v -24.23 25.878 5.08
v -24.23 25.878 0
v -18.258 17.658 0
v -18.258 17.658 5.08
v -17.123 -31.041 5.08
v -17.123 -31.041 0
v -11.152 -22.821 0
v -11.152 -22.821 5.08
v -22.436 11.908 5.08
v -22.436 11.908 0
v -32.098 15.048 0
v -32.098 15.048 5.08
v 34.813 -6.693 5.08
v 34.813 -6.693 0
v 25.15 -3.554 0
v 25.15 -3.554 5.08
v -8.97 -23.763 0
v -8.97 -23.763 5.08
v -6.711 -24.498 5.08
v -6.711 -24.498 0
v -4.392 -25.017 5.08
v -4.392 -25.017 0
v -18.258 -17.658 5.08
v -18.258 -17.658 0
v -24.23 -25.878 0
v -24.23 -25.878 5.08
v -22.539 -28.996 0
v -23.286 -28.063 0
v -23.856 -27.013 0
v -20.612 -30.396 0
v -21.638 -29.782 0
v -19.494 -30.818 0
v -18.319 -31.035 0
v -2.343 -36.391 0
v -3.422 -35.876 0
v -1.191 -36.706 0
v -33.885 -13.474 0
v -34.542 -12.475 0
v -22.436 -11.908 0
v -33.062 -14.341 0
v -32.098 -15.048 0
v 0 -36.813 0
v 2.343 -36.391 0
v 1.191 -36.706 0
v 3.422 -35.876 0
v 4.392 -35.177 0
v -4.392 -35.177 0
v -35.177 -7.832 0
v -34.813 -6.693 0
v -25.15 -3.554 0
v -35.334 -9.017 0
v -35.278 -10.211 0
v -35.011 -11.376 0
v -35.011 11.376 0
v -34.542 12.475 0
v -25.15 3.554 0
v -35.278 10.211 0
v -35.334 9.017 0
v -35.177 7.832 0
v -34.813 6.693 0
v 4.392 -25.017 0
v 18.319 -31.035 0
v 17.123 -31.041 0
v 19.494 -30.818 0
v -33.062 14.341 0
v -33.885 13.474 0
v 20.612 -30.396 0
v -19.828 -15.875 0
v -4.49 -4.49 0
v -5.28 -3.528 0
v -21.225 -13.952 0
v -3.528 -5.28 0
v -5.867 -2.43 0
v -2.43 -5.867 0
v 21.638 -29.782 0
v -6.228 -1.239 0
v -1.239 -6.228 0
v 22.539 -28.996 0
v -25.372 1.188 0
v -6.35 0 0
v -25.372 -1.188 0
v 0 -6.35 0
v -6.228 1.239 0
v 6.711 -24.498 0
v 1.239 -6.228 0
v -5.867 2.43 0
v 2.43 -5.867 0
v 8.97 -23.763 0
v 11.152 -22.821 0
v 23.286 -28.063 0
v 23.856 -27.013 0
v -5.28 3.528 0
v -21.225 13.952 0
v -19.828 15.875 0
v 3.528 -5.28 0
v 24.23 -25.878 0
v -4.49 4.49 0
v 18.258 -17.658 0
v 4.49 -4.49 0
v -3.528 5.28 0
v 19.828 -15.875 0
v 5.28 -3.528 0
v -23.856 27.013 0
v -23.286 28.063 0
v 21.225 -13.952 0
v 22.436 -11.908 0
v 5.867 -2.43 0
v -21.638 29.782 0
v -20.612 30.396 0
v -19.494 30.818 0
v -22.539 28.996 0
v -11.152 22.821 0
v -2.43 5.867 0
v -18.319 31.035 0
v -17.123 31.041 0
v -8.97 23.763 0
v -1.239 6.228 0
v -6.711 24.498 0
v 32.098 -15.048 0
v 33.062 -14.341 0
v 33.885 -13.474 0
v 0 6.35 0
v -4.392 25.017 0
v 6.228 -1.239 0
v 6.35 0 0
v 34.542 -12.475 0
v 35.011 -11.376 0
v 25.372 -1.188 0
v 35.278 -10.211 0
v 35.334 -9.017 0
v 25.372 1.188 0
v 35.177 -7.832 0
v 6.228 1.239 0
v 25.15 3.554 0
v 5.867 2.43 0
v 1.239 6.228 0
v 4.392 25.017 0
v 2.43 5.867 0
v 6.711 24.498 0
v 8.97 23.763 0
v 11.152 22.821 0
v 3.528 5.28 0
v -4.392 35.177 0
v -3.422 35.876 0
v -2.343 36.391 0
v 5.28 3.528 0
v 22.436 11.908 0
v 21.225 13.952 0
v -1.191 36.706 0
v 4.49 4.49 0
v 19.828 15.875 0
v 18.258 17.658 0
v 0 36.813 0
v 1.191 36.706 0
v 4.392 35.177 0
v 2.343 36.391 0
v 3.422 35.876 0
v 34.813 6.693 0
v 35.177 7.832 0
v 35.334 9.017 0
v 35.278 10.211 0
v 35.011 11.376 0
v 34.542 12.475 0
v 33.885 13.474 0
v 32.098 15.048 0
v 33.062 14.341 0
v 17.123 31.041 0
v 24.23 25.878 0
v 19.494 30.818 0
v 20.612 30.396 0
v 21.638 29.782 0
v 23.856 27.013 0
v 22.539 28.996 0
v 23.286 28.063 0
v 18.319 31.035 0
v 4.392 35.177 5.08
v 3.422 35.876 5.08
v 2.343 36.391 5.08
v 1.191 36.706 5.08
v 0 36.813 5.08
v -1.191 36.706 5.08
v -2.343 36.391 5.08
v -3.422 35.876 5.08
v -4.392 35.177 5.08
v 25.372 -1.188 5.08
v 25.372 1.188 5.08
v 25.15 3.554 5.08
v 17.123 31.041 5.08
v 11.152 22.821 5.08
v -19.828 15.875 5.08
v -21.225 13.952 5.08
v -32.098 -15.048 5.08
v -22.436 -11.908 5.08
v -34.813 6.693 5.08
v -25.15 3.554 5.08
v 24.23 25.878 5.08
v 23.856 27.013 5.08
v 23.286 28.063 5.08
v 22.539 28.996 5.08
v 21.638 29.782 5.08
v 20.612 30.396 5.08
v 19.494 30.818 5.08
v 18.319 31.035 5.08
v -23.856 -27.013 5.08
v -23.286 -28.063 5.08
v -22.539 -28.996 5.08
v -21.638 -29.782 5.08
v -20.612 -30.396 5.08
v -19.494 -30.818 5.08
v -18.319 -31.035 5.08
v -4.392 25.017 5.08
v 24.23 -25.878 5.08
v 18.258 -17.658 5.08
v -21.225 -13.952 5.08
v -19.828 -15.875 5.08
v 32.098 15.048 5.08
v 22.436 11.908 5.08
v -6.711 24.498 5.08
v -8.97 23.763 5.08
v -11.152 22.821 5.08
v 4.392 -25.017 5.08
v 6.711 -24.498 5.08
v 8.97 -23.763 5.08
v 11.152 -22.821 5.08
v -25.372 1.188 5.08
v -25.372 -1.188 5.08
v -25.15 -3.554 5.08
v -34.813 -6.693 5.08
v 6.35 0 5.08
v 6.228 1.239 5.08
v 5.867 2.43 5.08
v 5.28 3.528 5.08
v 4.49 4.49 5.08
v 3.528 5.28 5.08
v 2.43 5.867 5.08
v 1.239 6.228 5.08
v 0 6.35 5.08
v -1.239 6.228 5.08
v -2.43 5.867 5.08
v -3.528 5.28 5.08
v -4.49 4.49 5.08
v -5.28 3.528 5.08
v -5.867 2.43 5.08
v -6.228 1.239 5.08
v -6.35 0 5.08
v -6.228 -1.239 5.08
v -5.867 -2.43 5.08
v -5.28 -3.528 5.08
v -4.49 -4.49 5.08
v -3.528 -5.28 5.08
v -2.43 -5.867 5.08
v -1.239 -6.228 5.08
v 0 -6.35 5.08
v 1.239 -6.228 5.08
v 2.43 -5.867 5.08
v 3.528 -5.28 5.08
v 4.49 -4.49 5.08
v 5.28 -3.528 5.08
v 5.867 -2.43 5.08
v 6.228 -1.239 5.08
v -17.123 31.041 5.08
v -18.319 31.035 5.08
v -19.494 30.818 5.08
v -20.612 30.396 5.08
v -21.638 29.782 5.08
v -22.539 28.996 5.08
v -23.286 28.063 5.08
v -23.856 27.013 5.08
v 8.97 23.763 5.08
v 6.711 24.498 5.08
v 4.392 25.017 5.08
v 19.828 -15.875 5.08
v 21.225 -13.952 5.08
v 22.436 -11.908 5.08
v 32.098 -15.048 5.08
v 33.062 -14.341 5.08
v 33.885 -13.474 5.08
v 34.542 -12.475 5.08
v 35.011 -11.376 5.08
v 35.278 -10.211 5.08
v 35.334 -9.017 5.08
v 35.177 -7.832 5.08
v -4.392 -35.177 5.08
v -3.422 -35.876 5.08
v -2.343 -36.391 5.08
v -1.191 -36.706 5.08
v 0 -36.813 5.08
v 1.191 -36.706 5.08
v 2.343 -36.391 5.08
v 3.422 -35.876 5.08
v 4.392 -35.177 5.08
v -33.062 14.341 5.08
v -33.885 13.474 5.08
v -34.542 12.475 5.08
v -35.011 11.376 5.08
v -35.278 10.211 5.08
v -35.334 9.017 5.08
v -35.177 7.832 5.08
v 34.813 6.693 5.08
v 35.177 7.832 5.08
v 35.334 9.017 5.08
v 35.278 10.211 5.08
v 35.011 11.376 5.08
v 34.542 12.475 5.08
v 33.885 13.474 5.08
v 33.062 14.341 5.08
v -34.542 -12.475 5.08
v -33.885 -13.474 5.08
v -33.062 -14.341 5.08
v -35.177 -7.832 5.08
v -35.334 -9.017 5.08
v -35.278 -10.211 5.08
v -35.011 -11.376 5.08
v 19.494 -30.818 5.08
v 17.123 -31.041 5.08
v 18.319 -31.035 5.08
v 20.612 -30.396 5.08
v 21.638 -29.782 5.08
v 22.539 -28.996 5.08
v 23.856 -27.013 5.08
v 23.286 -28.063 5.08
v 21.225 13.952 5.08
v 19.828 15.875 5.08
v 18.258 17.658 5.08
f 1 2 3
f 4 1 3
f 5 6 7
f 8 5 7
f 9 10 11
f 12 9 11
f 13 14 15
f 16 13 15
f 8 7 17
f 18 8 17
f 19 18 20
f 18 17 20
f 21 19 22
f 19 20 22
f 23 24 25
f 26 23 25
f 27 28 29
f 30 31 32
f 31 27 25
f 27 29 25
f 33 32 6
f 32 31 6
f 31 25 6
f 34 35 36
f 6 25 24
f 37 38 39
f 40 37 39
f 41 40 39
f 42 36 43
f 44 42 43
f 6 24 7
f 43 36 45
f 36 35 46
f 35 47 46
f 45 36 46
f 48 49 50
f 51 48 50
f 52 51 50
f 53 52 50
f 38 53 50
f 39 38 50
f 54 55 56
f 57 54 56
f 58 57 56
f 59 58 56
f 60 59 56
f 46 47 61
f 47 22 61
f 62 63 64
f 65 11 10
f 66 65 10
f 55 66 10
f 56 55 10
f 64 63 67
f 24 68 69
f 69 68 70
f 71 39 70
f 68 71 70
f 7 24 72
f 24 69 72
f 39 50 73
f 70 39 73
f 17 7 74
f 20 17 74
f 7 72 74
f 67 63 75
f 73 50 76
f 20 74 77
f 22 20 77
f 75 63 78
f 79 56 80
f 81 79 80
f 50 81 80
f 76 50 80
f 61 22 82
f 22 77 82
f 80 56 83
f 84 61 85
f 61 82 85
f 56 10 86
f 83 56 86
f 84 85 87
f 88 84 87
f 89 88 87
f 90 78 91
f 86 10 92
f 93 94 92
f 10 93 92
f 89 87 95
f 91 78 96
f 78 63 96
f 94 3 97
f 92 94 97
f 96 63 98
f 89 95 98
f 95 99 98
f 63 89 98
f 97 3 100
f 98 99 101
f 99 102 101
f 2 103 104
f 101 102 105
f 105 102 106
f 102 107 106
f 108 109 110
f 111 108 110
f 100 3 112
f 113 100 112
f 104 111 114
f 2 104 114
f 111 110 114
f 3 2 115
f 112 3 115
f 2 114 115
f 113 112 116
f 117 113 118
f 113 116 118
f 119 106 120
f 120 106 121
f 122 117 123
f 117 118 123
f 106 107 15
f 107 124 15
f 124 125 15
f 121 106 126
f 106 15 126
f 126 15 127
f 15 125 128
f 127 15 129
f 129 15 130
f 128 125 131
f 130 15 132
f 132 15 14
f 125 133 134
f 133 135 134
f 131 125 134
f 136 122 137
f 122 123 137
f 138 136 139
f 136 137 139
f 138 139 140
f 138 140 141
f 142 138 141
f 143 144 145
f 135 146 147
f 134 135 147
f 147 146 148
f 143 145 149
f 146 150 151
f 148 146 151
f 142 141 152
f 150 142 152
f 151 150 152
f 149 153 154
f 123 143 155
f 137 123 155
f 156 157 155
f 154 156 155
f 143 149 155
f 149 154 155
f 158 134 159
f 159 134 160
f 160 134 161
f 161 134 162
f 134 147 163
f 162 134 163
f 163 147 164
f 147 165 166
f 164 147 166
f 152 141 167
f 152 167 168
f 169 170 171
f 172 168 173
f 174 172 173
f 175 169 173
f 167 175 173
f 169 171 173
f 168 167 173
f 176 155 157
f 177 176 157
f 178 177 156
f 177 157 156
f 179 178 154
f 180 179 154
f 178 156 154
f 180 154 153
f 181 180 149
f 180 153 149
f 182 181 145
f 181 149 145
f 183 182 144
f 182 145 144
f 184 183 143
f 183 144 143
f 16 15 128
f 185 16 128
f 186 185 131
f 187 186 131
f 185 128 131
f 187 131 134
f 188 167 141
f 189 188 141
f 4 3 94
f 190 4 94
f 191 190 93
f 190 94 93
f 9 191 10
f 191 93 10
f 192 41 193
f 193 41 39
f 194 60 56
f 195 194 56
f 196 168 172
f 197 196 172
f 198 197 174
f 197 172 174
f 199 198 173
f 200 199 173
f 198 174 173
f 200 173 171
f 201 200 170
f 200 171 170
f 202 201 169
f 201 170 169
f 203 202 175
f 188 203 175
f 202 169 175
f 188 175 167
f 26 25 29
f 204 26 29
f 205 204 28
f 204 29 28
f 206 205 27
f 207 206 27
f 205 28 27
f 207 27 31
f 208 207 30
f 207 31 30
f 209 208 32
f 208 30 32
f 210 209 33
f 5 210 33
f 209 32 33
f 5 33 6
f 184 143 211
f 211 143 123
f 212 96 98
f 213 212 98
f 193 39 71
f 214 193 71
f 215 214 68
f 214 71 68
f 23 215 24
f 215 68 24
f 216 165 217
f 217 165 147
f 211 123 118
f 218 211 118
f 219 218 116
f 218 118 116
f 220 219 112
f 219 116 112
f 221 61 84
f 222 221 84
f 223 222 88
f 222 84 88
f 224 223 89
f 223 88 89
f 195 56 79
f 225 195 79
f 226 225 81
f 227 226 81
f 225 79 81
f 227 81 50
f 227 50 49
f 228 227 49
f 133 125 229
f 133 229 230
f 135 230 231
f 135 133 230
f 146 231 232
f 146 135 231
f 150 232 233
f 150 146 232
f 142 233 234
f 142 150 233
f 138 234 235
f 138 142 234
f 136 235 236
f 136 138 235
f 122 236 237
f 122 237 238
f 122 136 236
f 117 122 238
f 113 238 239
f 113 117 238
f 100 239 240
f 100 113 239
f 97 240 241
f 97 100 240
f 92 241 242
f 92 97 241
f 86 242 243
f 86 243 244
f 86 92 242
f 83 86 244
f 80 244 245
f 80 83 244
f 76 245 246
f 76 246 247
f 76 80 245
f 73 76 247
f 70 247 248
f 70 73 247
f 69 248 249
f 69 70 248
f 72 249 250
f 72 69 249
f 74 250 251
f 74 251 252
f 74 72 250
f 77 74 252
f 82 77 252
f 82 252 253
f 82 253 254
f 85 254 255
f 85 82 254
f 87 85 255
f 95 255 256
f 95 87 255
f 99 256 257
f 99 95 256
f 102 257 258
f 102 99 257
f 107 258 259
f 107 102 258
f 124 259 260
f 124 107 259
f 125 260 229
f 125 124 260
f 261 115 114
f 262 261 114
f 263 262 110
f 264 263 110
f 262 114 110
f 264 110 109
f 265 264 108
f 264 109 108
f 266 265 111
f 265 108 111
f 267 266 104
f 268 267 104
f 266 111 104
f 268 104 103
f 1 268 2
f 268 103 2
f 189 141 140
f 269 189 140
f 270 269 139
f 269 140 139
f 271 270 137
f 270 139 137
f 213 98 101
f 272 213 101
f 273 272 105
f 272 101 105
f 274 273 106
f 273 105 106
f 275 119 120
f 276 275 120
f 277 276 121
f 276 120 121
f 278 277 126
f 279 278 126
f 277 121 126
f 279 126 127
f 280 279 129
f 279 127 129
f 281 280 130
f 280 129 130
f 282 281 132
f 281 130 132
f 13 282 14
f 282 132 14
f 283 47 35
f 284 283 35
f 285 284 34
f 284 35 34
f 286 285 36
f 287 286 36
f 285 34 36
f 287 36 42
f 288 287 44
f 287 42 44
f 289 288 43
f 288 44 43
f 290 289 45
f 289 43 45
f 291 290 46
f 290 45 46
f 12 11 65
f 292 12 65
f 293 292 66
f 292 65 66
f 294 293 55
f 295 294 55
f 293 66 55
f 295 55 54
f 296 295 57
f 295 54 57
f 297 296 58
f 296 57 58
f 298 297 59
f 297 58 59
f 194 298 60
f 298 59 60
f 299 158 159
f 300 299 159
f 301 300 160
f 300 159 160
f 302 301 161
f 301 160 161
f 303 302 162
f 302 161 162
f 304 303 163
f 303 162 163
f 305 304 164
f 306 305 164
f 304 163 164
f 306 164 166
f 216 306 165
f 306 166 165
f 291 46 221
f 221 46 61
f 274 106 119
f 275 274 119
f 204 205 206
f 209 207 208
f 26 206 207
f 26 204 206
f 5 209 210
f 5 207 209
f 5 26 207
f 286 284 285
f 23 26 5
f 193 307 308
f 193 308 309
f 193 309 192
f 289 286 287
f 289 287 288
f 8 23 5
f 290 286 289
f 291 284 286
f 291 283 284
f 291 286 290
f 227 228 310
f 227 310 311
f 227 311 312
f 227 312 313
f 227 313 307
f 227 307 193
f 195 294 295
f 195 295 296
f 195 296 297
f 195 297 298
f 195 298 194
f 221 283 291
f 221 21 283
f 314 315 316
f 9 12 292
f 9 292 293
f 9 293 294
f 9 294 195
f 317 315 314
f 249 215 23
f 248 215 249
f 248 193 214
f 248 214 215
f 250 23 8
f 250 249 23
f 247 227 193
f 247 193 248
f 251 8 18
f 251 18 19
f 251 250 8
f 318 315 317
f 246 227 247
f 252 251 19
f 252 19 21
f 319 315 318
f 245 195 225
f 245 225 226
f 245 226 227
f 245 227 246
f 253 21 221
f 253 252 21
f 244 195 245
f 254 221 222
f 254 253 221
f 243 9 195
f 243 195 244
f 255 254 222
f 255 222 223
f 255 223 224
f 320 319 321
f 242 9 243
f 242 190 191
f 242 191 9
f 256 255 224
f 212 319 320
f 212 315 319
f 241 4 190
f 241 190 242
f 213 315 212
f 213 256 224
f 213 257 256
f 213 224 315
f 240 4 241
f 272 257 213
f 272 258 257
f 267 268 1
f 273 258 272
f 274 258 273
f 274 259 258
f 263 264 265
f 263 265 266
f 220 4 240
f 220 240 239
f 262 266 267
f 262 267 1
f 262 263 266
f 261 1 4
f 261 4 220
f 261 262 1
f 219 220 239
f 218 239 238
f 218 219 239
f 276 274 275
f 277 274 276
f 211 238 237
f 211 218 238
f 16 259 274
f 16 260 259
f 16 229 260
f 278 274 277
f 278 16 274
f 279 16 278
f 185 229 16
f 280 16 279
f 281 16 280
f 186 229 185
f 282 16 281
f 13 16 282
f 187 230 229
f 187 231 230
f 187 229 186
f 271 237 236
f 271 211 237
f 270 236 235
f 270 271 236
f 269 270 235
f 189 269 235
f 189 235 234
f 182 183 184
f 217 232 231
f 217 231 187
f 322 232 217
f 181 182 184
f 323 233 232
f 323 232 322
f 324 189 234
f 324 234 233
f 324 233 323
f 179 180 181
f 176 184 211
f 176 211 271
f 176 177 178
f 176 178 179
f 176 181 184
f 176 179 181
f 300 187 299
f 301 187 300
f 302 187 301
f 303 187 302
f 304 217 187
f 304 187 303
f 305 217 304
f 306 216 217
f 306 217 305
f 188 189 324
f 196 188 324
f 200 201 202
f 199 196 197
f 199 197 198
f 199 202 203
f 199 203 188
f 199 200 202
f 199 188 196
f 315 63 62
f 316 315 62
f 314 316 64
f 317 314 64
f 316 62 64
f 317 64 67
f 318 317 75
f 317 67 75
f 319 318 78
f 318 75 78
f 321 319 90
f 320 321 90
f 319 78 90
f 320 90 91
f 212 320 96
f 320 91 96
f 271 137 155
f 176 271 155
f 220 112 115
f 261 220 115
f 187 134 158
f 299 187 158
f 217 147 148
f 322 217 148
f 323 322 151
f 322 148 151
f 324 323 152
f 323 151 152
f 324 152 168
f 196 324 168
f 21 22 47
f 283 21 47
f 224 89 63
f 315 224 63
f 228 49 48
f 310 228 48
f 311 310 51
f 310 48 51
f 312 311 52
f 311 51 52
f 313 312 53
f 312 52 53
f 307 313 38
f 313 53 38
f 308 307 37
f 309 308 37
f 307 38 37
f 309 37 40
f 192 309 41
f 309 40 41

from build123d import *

# Parameters (mm, degrees)
F0_R     = 6.35
F1_DEPTH = 5.08


with BuildPart() as f1:
    # F0 (on Top) → F1 (new body)
    with BuildSketch(Plane.XY):
        with BuildLine():
            Line((-4.392071, 35.177388), (-4.392071, 25.017388))
            ThreePointArc((-4.392071, 25.017388), (-7.849032, 24.156836), (-11.151592, 22.821087))
            Line((-11.151592, 22.821087), (-17.12349, 31.040699))
            ThreePointArc((-17.12349, 31.040699), (-21.638018, 29.782177), (-24.23001, 25.877511))
            Line((-24.23001, 25.877511), (-18.258112, 17.657898))
            ThreePointArc((-18.258112, 17.657898), (-20.549032, 14.929745), (-22.435726, 11.907905))
            Line((-22.435726, 11.907905), (-32.09846, 15.047518))
            ThreePointArc((-32.09846, 15.047518), (-35.011048, 11.375779), (-34.812909, 6.693303))
            Line((-34.812909, 6.693303), (-25.150175, 3.553691))
            ThreePointArc((-25.150175, 3.553691), (-25.4, 0), (-25.150175, -3.553691))
            Line((-25.150175, -3.553691), (-34.812909, -6.693303))
            ThreePointArc((-34.812909, -6.693303), (-35.011048, -11.375779), (-32.09846, -15.047518))
            Line((-32.09846, -15.047518), (-22.435726, -11.907905))
            ThreePointArc((-22.435726, -11.907905), (-20.549032, -14.929745), (-18.258112, -17.657898))
            Line((-18.258112, -17.657898), (-24.23001, -25.877511))
            ThreePointArc((-24.23001, -25.877511), (-21.638018, -29.782177), (-17.12349, -31.040699))
            Line((-17.12349, -31.040699), (-11.151592, -22.821087))
            ThreePointArc((-11.151592, -22.821087), (-7.849032, -24.156836), (-4.392071, -25.017388))
            Line((-4.392071, -25.017388), (-4.392071, -35.177388))
            ThreePointArc((-4.392071, -35.177388), (0, -36.812795), (4.392071, -35.177388))
            Line((4.392071, -35.177388), (4.392071, -25.017388))
            ThreePointArc((4.392071, -25.017388), (7.849032, -24.156836), (11.151592, -22.821087))
            Line((11.151592, -22.821087), (17.12349, -31.040699))
            ThreePointArc((17.12349, -31.040699), (21.638018, -29.782177), (24.23001, -25.877511))
            Line((24.23001, -25.877511), (18.258112, -17.657898))
            ThreePointArc((18.258112, -17.657898), (20.549032, -14.929745), (22.435726, -11.907905))
            Line((22.435726, -11.907905), (32.09846, -15.047518))
            ThreePointArc((32.09846, -15.047518), (35.011048, -11.375779), (34.812909, -6.693303))
            Line((34.812909, -6.693303), (25.150175, -3.553691))
            ThreePointArc((25.150175, -3.553691), (25.4, 0), (25.150175, 3.553691))
            Line((25.150175, 3.553691), (34.812909, 6.693303))
            ThreePointArc((34.812909, 6.693303), (35.011048, 11.375779), (32.09846, 15.047518))
            Line((32.09846, 15.047518), (22.435726, 11.907905))
            ThreePointArc((22.435726, 11.907905), (20.549032, 14.929745), (18.258112, 17.657898))
            Line((18.258112, 17.657898), (24.23001, 25.877511))
            ThreePointArc((24.23001, 25.877511), (21.638018, 29.782177), (17.12349, 31.040699))
            Line((17.12349, 31.040699), (11.151592, 22.821087))
            ThreePointArc((11.151592, 22.821087), (7.849032, 24.156836), (4.392071, 25.017388))
            Line((4.392071, 25.017388), (4.392071, 35.177388))
            ThreePointArc((4.392071, 35.177388), (0, 36.812795), (-4.392071, 35.177388))
        make_face()
        Circle(F0_R, mode=Mode.SUBTRACT)
    extrude(amount=F1_DEPTH)


solid = f1.part
